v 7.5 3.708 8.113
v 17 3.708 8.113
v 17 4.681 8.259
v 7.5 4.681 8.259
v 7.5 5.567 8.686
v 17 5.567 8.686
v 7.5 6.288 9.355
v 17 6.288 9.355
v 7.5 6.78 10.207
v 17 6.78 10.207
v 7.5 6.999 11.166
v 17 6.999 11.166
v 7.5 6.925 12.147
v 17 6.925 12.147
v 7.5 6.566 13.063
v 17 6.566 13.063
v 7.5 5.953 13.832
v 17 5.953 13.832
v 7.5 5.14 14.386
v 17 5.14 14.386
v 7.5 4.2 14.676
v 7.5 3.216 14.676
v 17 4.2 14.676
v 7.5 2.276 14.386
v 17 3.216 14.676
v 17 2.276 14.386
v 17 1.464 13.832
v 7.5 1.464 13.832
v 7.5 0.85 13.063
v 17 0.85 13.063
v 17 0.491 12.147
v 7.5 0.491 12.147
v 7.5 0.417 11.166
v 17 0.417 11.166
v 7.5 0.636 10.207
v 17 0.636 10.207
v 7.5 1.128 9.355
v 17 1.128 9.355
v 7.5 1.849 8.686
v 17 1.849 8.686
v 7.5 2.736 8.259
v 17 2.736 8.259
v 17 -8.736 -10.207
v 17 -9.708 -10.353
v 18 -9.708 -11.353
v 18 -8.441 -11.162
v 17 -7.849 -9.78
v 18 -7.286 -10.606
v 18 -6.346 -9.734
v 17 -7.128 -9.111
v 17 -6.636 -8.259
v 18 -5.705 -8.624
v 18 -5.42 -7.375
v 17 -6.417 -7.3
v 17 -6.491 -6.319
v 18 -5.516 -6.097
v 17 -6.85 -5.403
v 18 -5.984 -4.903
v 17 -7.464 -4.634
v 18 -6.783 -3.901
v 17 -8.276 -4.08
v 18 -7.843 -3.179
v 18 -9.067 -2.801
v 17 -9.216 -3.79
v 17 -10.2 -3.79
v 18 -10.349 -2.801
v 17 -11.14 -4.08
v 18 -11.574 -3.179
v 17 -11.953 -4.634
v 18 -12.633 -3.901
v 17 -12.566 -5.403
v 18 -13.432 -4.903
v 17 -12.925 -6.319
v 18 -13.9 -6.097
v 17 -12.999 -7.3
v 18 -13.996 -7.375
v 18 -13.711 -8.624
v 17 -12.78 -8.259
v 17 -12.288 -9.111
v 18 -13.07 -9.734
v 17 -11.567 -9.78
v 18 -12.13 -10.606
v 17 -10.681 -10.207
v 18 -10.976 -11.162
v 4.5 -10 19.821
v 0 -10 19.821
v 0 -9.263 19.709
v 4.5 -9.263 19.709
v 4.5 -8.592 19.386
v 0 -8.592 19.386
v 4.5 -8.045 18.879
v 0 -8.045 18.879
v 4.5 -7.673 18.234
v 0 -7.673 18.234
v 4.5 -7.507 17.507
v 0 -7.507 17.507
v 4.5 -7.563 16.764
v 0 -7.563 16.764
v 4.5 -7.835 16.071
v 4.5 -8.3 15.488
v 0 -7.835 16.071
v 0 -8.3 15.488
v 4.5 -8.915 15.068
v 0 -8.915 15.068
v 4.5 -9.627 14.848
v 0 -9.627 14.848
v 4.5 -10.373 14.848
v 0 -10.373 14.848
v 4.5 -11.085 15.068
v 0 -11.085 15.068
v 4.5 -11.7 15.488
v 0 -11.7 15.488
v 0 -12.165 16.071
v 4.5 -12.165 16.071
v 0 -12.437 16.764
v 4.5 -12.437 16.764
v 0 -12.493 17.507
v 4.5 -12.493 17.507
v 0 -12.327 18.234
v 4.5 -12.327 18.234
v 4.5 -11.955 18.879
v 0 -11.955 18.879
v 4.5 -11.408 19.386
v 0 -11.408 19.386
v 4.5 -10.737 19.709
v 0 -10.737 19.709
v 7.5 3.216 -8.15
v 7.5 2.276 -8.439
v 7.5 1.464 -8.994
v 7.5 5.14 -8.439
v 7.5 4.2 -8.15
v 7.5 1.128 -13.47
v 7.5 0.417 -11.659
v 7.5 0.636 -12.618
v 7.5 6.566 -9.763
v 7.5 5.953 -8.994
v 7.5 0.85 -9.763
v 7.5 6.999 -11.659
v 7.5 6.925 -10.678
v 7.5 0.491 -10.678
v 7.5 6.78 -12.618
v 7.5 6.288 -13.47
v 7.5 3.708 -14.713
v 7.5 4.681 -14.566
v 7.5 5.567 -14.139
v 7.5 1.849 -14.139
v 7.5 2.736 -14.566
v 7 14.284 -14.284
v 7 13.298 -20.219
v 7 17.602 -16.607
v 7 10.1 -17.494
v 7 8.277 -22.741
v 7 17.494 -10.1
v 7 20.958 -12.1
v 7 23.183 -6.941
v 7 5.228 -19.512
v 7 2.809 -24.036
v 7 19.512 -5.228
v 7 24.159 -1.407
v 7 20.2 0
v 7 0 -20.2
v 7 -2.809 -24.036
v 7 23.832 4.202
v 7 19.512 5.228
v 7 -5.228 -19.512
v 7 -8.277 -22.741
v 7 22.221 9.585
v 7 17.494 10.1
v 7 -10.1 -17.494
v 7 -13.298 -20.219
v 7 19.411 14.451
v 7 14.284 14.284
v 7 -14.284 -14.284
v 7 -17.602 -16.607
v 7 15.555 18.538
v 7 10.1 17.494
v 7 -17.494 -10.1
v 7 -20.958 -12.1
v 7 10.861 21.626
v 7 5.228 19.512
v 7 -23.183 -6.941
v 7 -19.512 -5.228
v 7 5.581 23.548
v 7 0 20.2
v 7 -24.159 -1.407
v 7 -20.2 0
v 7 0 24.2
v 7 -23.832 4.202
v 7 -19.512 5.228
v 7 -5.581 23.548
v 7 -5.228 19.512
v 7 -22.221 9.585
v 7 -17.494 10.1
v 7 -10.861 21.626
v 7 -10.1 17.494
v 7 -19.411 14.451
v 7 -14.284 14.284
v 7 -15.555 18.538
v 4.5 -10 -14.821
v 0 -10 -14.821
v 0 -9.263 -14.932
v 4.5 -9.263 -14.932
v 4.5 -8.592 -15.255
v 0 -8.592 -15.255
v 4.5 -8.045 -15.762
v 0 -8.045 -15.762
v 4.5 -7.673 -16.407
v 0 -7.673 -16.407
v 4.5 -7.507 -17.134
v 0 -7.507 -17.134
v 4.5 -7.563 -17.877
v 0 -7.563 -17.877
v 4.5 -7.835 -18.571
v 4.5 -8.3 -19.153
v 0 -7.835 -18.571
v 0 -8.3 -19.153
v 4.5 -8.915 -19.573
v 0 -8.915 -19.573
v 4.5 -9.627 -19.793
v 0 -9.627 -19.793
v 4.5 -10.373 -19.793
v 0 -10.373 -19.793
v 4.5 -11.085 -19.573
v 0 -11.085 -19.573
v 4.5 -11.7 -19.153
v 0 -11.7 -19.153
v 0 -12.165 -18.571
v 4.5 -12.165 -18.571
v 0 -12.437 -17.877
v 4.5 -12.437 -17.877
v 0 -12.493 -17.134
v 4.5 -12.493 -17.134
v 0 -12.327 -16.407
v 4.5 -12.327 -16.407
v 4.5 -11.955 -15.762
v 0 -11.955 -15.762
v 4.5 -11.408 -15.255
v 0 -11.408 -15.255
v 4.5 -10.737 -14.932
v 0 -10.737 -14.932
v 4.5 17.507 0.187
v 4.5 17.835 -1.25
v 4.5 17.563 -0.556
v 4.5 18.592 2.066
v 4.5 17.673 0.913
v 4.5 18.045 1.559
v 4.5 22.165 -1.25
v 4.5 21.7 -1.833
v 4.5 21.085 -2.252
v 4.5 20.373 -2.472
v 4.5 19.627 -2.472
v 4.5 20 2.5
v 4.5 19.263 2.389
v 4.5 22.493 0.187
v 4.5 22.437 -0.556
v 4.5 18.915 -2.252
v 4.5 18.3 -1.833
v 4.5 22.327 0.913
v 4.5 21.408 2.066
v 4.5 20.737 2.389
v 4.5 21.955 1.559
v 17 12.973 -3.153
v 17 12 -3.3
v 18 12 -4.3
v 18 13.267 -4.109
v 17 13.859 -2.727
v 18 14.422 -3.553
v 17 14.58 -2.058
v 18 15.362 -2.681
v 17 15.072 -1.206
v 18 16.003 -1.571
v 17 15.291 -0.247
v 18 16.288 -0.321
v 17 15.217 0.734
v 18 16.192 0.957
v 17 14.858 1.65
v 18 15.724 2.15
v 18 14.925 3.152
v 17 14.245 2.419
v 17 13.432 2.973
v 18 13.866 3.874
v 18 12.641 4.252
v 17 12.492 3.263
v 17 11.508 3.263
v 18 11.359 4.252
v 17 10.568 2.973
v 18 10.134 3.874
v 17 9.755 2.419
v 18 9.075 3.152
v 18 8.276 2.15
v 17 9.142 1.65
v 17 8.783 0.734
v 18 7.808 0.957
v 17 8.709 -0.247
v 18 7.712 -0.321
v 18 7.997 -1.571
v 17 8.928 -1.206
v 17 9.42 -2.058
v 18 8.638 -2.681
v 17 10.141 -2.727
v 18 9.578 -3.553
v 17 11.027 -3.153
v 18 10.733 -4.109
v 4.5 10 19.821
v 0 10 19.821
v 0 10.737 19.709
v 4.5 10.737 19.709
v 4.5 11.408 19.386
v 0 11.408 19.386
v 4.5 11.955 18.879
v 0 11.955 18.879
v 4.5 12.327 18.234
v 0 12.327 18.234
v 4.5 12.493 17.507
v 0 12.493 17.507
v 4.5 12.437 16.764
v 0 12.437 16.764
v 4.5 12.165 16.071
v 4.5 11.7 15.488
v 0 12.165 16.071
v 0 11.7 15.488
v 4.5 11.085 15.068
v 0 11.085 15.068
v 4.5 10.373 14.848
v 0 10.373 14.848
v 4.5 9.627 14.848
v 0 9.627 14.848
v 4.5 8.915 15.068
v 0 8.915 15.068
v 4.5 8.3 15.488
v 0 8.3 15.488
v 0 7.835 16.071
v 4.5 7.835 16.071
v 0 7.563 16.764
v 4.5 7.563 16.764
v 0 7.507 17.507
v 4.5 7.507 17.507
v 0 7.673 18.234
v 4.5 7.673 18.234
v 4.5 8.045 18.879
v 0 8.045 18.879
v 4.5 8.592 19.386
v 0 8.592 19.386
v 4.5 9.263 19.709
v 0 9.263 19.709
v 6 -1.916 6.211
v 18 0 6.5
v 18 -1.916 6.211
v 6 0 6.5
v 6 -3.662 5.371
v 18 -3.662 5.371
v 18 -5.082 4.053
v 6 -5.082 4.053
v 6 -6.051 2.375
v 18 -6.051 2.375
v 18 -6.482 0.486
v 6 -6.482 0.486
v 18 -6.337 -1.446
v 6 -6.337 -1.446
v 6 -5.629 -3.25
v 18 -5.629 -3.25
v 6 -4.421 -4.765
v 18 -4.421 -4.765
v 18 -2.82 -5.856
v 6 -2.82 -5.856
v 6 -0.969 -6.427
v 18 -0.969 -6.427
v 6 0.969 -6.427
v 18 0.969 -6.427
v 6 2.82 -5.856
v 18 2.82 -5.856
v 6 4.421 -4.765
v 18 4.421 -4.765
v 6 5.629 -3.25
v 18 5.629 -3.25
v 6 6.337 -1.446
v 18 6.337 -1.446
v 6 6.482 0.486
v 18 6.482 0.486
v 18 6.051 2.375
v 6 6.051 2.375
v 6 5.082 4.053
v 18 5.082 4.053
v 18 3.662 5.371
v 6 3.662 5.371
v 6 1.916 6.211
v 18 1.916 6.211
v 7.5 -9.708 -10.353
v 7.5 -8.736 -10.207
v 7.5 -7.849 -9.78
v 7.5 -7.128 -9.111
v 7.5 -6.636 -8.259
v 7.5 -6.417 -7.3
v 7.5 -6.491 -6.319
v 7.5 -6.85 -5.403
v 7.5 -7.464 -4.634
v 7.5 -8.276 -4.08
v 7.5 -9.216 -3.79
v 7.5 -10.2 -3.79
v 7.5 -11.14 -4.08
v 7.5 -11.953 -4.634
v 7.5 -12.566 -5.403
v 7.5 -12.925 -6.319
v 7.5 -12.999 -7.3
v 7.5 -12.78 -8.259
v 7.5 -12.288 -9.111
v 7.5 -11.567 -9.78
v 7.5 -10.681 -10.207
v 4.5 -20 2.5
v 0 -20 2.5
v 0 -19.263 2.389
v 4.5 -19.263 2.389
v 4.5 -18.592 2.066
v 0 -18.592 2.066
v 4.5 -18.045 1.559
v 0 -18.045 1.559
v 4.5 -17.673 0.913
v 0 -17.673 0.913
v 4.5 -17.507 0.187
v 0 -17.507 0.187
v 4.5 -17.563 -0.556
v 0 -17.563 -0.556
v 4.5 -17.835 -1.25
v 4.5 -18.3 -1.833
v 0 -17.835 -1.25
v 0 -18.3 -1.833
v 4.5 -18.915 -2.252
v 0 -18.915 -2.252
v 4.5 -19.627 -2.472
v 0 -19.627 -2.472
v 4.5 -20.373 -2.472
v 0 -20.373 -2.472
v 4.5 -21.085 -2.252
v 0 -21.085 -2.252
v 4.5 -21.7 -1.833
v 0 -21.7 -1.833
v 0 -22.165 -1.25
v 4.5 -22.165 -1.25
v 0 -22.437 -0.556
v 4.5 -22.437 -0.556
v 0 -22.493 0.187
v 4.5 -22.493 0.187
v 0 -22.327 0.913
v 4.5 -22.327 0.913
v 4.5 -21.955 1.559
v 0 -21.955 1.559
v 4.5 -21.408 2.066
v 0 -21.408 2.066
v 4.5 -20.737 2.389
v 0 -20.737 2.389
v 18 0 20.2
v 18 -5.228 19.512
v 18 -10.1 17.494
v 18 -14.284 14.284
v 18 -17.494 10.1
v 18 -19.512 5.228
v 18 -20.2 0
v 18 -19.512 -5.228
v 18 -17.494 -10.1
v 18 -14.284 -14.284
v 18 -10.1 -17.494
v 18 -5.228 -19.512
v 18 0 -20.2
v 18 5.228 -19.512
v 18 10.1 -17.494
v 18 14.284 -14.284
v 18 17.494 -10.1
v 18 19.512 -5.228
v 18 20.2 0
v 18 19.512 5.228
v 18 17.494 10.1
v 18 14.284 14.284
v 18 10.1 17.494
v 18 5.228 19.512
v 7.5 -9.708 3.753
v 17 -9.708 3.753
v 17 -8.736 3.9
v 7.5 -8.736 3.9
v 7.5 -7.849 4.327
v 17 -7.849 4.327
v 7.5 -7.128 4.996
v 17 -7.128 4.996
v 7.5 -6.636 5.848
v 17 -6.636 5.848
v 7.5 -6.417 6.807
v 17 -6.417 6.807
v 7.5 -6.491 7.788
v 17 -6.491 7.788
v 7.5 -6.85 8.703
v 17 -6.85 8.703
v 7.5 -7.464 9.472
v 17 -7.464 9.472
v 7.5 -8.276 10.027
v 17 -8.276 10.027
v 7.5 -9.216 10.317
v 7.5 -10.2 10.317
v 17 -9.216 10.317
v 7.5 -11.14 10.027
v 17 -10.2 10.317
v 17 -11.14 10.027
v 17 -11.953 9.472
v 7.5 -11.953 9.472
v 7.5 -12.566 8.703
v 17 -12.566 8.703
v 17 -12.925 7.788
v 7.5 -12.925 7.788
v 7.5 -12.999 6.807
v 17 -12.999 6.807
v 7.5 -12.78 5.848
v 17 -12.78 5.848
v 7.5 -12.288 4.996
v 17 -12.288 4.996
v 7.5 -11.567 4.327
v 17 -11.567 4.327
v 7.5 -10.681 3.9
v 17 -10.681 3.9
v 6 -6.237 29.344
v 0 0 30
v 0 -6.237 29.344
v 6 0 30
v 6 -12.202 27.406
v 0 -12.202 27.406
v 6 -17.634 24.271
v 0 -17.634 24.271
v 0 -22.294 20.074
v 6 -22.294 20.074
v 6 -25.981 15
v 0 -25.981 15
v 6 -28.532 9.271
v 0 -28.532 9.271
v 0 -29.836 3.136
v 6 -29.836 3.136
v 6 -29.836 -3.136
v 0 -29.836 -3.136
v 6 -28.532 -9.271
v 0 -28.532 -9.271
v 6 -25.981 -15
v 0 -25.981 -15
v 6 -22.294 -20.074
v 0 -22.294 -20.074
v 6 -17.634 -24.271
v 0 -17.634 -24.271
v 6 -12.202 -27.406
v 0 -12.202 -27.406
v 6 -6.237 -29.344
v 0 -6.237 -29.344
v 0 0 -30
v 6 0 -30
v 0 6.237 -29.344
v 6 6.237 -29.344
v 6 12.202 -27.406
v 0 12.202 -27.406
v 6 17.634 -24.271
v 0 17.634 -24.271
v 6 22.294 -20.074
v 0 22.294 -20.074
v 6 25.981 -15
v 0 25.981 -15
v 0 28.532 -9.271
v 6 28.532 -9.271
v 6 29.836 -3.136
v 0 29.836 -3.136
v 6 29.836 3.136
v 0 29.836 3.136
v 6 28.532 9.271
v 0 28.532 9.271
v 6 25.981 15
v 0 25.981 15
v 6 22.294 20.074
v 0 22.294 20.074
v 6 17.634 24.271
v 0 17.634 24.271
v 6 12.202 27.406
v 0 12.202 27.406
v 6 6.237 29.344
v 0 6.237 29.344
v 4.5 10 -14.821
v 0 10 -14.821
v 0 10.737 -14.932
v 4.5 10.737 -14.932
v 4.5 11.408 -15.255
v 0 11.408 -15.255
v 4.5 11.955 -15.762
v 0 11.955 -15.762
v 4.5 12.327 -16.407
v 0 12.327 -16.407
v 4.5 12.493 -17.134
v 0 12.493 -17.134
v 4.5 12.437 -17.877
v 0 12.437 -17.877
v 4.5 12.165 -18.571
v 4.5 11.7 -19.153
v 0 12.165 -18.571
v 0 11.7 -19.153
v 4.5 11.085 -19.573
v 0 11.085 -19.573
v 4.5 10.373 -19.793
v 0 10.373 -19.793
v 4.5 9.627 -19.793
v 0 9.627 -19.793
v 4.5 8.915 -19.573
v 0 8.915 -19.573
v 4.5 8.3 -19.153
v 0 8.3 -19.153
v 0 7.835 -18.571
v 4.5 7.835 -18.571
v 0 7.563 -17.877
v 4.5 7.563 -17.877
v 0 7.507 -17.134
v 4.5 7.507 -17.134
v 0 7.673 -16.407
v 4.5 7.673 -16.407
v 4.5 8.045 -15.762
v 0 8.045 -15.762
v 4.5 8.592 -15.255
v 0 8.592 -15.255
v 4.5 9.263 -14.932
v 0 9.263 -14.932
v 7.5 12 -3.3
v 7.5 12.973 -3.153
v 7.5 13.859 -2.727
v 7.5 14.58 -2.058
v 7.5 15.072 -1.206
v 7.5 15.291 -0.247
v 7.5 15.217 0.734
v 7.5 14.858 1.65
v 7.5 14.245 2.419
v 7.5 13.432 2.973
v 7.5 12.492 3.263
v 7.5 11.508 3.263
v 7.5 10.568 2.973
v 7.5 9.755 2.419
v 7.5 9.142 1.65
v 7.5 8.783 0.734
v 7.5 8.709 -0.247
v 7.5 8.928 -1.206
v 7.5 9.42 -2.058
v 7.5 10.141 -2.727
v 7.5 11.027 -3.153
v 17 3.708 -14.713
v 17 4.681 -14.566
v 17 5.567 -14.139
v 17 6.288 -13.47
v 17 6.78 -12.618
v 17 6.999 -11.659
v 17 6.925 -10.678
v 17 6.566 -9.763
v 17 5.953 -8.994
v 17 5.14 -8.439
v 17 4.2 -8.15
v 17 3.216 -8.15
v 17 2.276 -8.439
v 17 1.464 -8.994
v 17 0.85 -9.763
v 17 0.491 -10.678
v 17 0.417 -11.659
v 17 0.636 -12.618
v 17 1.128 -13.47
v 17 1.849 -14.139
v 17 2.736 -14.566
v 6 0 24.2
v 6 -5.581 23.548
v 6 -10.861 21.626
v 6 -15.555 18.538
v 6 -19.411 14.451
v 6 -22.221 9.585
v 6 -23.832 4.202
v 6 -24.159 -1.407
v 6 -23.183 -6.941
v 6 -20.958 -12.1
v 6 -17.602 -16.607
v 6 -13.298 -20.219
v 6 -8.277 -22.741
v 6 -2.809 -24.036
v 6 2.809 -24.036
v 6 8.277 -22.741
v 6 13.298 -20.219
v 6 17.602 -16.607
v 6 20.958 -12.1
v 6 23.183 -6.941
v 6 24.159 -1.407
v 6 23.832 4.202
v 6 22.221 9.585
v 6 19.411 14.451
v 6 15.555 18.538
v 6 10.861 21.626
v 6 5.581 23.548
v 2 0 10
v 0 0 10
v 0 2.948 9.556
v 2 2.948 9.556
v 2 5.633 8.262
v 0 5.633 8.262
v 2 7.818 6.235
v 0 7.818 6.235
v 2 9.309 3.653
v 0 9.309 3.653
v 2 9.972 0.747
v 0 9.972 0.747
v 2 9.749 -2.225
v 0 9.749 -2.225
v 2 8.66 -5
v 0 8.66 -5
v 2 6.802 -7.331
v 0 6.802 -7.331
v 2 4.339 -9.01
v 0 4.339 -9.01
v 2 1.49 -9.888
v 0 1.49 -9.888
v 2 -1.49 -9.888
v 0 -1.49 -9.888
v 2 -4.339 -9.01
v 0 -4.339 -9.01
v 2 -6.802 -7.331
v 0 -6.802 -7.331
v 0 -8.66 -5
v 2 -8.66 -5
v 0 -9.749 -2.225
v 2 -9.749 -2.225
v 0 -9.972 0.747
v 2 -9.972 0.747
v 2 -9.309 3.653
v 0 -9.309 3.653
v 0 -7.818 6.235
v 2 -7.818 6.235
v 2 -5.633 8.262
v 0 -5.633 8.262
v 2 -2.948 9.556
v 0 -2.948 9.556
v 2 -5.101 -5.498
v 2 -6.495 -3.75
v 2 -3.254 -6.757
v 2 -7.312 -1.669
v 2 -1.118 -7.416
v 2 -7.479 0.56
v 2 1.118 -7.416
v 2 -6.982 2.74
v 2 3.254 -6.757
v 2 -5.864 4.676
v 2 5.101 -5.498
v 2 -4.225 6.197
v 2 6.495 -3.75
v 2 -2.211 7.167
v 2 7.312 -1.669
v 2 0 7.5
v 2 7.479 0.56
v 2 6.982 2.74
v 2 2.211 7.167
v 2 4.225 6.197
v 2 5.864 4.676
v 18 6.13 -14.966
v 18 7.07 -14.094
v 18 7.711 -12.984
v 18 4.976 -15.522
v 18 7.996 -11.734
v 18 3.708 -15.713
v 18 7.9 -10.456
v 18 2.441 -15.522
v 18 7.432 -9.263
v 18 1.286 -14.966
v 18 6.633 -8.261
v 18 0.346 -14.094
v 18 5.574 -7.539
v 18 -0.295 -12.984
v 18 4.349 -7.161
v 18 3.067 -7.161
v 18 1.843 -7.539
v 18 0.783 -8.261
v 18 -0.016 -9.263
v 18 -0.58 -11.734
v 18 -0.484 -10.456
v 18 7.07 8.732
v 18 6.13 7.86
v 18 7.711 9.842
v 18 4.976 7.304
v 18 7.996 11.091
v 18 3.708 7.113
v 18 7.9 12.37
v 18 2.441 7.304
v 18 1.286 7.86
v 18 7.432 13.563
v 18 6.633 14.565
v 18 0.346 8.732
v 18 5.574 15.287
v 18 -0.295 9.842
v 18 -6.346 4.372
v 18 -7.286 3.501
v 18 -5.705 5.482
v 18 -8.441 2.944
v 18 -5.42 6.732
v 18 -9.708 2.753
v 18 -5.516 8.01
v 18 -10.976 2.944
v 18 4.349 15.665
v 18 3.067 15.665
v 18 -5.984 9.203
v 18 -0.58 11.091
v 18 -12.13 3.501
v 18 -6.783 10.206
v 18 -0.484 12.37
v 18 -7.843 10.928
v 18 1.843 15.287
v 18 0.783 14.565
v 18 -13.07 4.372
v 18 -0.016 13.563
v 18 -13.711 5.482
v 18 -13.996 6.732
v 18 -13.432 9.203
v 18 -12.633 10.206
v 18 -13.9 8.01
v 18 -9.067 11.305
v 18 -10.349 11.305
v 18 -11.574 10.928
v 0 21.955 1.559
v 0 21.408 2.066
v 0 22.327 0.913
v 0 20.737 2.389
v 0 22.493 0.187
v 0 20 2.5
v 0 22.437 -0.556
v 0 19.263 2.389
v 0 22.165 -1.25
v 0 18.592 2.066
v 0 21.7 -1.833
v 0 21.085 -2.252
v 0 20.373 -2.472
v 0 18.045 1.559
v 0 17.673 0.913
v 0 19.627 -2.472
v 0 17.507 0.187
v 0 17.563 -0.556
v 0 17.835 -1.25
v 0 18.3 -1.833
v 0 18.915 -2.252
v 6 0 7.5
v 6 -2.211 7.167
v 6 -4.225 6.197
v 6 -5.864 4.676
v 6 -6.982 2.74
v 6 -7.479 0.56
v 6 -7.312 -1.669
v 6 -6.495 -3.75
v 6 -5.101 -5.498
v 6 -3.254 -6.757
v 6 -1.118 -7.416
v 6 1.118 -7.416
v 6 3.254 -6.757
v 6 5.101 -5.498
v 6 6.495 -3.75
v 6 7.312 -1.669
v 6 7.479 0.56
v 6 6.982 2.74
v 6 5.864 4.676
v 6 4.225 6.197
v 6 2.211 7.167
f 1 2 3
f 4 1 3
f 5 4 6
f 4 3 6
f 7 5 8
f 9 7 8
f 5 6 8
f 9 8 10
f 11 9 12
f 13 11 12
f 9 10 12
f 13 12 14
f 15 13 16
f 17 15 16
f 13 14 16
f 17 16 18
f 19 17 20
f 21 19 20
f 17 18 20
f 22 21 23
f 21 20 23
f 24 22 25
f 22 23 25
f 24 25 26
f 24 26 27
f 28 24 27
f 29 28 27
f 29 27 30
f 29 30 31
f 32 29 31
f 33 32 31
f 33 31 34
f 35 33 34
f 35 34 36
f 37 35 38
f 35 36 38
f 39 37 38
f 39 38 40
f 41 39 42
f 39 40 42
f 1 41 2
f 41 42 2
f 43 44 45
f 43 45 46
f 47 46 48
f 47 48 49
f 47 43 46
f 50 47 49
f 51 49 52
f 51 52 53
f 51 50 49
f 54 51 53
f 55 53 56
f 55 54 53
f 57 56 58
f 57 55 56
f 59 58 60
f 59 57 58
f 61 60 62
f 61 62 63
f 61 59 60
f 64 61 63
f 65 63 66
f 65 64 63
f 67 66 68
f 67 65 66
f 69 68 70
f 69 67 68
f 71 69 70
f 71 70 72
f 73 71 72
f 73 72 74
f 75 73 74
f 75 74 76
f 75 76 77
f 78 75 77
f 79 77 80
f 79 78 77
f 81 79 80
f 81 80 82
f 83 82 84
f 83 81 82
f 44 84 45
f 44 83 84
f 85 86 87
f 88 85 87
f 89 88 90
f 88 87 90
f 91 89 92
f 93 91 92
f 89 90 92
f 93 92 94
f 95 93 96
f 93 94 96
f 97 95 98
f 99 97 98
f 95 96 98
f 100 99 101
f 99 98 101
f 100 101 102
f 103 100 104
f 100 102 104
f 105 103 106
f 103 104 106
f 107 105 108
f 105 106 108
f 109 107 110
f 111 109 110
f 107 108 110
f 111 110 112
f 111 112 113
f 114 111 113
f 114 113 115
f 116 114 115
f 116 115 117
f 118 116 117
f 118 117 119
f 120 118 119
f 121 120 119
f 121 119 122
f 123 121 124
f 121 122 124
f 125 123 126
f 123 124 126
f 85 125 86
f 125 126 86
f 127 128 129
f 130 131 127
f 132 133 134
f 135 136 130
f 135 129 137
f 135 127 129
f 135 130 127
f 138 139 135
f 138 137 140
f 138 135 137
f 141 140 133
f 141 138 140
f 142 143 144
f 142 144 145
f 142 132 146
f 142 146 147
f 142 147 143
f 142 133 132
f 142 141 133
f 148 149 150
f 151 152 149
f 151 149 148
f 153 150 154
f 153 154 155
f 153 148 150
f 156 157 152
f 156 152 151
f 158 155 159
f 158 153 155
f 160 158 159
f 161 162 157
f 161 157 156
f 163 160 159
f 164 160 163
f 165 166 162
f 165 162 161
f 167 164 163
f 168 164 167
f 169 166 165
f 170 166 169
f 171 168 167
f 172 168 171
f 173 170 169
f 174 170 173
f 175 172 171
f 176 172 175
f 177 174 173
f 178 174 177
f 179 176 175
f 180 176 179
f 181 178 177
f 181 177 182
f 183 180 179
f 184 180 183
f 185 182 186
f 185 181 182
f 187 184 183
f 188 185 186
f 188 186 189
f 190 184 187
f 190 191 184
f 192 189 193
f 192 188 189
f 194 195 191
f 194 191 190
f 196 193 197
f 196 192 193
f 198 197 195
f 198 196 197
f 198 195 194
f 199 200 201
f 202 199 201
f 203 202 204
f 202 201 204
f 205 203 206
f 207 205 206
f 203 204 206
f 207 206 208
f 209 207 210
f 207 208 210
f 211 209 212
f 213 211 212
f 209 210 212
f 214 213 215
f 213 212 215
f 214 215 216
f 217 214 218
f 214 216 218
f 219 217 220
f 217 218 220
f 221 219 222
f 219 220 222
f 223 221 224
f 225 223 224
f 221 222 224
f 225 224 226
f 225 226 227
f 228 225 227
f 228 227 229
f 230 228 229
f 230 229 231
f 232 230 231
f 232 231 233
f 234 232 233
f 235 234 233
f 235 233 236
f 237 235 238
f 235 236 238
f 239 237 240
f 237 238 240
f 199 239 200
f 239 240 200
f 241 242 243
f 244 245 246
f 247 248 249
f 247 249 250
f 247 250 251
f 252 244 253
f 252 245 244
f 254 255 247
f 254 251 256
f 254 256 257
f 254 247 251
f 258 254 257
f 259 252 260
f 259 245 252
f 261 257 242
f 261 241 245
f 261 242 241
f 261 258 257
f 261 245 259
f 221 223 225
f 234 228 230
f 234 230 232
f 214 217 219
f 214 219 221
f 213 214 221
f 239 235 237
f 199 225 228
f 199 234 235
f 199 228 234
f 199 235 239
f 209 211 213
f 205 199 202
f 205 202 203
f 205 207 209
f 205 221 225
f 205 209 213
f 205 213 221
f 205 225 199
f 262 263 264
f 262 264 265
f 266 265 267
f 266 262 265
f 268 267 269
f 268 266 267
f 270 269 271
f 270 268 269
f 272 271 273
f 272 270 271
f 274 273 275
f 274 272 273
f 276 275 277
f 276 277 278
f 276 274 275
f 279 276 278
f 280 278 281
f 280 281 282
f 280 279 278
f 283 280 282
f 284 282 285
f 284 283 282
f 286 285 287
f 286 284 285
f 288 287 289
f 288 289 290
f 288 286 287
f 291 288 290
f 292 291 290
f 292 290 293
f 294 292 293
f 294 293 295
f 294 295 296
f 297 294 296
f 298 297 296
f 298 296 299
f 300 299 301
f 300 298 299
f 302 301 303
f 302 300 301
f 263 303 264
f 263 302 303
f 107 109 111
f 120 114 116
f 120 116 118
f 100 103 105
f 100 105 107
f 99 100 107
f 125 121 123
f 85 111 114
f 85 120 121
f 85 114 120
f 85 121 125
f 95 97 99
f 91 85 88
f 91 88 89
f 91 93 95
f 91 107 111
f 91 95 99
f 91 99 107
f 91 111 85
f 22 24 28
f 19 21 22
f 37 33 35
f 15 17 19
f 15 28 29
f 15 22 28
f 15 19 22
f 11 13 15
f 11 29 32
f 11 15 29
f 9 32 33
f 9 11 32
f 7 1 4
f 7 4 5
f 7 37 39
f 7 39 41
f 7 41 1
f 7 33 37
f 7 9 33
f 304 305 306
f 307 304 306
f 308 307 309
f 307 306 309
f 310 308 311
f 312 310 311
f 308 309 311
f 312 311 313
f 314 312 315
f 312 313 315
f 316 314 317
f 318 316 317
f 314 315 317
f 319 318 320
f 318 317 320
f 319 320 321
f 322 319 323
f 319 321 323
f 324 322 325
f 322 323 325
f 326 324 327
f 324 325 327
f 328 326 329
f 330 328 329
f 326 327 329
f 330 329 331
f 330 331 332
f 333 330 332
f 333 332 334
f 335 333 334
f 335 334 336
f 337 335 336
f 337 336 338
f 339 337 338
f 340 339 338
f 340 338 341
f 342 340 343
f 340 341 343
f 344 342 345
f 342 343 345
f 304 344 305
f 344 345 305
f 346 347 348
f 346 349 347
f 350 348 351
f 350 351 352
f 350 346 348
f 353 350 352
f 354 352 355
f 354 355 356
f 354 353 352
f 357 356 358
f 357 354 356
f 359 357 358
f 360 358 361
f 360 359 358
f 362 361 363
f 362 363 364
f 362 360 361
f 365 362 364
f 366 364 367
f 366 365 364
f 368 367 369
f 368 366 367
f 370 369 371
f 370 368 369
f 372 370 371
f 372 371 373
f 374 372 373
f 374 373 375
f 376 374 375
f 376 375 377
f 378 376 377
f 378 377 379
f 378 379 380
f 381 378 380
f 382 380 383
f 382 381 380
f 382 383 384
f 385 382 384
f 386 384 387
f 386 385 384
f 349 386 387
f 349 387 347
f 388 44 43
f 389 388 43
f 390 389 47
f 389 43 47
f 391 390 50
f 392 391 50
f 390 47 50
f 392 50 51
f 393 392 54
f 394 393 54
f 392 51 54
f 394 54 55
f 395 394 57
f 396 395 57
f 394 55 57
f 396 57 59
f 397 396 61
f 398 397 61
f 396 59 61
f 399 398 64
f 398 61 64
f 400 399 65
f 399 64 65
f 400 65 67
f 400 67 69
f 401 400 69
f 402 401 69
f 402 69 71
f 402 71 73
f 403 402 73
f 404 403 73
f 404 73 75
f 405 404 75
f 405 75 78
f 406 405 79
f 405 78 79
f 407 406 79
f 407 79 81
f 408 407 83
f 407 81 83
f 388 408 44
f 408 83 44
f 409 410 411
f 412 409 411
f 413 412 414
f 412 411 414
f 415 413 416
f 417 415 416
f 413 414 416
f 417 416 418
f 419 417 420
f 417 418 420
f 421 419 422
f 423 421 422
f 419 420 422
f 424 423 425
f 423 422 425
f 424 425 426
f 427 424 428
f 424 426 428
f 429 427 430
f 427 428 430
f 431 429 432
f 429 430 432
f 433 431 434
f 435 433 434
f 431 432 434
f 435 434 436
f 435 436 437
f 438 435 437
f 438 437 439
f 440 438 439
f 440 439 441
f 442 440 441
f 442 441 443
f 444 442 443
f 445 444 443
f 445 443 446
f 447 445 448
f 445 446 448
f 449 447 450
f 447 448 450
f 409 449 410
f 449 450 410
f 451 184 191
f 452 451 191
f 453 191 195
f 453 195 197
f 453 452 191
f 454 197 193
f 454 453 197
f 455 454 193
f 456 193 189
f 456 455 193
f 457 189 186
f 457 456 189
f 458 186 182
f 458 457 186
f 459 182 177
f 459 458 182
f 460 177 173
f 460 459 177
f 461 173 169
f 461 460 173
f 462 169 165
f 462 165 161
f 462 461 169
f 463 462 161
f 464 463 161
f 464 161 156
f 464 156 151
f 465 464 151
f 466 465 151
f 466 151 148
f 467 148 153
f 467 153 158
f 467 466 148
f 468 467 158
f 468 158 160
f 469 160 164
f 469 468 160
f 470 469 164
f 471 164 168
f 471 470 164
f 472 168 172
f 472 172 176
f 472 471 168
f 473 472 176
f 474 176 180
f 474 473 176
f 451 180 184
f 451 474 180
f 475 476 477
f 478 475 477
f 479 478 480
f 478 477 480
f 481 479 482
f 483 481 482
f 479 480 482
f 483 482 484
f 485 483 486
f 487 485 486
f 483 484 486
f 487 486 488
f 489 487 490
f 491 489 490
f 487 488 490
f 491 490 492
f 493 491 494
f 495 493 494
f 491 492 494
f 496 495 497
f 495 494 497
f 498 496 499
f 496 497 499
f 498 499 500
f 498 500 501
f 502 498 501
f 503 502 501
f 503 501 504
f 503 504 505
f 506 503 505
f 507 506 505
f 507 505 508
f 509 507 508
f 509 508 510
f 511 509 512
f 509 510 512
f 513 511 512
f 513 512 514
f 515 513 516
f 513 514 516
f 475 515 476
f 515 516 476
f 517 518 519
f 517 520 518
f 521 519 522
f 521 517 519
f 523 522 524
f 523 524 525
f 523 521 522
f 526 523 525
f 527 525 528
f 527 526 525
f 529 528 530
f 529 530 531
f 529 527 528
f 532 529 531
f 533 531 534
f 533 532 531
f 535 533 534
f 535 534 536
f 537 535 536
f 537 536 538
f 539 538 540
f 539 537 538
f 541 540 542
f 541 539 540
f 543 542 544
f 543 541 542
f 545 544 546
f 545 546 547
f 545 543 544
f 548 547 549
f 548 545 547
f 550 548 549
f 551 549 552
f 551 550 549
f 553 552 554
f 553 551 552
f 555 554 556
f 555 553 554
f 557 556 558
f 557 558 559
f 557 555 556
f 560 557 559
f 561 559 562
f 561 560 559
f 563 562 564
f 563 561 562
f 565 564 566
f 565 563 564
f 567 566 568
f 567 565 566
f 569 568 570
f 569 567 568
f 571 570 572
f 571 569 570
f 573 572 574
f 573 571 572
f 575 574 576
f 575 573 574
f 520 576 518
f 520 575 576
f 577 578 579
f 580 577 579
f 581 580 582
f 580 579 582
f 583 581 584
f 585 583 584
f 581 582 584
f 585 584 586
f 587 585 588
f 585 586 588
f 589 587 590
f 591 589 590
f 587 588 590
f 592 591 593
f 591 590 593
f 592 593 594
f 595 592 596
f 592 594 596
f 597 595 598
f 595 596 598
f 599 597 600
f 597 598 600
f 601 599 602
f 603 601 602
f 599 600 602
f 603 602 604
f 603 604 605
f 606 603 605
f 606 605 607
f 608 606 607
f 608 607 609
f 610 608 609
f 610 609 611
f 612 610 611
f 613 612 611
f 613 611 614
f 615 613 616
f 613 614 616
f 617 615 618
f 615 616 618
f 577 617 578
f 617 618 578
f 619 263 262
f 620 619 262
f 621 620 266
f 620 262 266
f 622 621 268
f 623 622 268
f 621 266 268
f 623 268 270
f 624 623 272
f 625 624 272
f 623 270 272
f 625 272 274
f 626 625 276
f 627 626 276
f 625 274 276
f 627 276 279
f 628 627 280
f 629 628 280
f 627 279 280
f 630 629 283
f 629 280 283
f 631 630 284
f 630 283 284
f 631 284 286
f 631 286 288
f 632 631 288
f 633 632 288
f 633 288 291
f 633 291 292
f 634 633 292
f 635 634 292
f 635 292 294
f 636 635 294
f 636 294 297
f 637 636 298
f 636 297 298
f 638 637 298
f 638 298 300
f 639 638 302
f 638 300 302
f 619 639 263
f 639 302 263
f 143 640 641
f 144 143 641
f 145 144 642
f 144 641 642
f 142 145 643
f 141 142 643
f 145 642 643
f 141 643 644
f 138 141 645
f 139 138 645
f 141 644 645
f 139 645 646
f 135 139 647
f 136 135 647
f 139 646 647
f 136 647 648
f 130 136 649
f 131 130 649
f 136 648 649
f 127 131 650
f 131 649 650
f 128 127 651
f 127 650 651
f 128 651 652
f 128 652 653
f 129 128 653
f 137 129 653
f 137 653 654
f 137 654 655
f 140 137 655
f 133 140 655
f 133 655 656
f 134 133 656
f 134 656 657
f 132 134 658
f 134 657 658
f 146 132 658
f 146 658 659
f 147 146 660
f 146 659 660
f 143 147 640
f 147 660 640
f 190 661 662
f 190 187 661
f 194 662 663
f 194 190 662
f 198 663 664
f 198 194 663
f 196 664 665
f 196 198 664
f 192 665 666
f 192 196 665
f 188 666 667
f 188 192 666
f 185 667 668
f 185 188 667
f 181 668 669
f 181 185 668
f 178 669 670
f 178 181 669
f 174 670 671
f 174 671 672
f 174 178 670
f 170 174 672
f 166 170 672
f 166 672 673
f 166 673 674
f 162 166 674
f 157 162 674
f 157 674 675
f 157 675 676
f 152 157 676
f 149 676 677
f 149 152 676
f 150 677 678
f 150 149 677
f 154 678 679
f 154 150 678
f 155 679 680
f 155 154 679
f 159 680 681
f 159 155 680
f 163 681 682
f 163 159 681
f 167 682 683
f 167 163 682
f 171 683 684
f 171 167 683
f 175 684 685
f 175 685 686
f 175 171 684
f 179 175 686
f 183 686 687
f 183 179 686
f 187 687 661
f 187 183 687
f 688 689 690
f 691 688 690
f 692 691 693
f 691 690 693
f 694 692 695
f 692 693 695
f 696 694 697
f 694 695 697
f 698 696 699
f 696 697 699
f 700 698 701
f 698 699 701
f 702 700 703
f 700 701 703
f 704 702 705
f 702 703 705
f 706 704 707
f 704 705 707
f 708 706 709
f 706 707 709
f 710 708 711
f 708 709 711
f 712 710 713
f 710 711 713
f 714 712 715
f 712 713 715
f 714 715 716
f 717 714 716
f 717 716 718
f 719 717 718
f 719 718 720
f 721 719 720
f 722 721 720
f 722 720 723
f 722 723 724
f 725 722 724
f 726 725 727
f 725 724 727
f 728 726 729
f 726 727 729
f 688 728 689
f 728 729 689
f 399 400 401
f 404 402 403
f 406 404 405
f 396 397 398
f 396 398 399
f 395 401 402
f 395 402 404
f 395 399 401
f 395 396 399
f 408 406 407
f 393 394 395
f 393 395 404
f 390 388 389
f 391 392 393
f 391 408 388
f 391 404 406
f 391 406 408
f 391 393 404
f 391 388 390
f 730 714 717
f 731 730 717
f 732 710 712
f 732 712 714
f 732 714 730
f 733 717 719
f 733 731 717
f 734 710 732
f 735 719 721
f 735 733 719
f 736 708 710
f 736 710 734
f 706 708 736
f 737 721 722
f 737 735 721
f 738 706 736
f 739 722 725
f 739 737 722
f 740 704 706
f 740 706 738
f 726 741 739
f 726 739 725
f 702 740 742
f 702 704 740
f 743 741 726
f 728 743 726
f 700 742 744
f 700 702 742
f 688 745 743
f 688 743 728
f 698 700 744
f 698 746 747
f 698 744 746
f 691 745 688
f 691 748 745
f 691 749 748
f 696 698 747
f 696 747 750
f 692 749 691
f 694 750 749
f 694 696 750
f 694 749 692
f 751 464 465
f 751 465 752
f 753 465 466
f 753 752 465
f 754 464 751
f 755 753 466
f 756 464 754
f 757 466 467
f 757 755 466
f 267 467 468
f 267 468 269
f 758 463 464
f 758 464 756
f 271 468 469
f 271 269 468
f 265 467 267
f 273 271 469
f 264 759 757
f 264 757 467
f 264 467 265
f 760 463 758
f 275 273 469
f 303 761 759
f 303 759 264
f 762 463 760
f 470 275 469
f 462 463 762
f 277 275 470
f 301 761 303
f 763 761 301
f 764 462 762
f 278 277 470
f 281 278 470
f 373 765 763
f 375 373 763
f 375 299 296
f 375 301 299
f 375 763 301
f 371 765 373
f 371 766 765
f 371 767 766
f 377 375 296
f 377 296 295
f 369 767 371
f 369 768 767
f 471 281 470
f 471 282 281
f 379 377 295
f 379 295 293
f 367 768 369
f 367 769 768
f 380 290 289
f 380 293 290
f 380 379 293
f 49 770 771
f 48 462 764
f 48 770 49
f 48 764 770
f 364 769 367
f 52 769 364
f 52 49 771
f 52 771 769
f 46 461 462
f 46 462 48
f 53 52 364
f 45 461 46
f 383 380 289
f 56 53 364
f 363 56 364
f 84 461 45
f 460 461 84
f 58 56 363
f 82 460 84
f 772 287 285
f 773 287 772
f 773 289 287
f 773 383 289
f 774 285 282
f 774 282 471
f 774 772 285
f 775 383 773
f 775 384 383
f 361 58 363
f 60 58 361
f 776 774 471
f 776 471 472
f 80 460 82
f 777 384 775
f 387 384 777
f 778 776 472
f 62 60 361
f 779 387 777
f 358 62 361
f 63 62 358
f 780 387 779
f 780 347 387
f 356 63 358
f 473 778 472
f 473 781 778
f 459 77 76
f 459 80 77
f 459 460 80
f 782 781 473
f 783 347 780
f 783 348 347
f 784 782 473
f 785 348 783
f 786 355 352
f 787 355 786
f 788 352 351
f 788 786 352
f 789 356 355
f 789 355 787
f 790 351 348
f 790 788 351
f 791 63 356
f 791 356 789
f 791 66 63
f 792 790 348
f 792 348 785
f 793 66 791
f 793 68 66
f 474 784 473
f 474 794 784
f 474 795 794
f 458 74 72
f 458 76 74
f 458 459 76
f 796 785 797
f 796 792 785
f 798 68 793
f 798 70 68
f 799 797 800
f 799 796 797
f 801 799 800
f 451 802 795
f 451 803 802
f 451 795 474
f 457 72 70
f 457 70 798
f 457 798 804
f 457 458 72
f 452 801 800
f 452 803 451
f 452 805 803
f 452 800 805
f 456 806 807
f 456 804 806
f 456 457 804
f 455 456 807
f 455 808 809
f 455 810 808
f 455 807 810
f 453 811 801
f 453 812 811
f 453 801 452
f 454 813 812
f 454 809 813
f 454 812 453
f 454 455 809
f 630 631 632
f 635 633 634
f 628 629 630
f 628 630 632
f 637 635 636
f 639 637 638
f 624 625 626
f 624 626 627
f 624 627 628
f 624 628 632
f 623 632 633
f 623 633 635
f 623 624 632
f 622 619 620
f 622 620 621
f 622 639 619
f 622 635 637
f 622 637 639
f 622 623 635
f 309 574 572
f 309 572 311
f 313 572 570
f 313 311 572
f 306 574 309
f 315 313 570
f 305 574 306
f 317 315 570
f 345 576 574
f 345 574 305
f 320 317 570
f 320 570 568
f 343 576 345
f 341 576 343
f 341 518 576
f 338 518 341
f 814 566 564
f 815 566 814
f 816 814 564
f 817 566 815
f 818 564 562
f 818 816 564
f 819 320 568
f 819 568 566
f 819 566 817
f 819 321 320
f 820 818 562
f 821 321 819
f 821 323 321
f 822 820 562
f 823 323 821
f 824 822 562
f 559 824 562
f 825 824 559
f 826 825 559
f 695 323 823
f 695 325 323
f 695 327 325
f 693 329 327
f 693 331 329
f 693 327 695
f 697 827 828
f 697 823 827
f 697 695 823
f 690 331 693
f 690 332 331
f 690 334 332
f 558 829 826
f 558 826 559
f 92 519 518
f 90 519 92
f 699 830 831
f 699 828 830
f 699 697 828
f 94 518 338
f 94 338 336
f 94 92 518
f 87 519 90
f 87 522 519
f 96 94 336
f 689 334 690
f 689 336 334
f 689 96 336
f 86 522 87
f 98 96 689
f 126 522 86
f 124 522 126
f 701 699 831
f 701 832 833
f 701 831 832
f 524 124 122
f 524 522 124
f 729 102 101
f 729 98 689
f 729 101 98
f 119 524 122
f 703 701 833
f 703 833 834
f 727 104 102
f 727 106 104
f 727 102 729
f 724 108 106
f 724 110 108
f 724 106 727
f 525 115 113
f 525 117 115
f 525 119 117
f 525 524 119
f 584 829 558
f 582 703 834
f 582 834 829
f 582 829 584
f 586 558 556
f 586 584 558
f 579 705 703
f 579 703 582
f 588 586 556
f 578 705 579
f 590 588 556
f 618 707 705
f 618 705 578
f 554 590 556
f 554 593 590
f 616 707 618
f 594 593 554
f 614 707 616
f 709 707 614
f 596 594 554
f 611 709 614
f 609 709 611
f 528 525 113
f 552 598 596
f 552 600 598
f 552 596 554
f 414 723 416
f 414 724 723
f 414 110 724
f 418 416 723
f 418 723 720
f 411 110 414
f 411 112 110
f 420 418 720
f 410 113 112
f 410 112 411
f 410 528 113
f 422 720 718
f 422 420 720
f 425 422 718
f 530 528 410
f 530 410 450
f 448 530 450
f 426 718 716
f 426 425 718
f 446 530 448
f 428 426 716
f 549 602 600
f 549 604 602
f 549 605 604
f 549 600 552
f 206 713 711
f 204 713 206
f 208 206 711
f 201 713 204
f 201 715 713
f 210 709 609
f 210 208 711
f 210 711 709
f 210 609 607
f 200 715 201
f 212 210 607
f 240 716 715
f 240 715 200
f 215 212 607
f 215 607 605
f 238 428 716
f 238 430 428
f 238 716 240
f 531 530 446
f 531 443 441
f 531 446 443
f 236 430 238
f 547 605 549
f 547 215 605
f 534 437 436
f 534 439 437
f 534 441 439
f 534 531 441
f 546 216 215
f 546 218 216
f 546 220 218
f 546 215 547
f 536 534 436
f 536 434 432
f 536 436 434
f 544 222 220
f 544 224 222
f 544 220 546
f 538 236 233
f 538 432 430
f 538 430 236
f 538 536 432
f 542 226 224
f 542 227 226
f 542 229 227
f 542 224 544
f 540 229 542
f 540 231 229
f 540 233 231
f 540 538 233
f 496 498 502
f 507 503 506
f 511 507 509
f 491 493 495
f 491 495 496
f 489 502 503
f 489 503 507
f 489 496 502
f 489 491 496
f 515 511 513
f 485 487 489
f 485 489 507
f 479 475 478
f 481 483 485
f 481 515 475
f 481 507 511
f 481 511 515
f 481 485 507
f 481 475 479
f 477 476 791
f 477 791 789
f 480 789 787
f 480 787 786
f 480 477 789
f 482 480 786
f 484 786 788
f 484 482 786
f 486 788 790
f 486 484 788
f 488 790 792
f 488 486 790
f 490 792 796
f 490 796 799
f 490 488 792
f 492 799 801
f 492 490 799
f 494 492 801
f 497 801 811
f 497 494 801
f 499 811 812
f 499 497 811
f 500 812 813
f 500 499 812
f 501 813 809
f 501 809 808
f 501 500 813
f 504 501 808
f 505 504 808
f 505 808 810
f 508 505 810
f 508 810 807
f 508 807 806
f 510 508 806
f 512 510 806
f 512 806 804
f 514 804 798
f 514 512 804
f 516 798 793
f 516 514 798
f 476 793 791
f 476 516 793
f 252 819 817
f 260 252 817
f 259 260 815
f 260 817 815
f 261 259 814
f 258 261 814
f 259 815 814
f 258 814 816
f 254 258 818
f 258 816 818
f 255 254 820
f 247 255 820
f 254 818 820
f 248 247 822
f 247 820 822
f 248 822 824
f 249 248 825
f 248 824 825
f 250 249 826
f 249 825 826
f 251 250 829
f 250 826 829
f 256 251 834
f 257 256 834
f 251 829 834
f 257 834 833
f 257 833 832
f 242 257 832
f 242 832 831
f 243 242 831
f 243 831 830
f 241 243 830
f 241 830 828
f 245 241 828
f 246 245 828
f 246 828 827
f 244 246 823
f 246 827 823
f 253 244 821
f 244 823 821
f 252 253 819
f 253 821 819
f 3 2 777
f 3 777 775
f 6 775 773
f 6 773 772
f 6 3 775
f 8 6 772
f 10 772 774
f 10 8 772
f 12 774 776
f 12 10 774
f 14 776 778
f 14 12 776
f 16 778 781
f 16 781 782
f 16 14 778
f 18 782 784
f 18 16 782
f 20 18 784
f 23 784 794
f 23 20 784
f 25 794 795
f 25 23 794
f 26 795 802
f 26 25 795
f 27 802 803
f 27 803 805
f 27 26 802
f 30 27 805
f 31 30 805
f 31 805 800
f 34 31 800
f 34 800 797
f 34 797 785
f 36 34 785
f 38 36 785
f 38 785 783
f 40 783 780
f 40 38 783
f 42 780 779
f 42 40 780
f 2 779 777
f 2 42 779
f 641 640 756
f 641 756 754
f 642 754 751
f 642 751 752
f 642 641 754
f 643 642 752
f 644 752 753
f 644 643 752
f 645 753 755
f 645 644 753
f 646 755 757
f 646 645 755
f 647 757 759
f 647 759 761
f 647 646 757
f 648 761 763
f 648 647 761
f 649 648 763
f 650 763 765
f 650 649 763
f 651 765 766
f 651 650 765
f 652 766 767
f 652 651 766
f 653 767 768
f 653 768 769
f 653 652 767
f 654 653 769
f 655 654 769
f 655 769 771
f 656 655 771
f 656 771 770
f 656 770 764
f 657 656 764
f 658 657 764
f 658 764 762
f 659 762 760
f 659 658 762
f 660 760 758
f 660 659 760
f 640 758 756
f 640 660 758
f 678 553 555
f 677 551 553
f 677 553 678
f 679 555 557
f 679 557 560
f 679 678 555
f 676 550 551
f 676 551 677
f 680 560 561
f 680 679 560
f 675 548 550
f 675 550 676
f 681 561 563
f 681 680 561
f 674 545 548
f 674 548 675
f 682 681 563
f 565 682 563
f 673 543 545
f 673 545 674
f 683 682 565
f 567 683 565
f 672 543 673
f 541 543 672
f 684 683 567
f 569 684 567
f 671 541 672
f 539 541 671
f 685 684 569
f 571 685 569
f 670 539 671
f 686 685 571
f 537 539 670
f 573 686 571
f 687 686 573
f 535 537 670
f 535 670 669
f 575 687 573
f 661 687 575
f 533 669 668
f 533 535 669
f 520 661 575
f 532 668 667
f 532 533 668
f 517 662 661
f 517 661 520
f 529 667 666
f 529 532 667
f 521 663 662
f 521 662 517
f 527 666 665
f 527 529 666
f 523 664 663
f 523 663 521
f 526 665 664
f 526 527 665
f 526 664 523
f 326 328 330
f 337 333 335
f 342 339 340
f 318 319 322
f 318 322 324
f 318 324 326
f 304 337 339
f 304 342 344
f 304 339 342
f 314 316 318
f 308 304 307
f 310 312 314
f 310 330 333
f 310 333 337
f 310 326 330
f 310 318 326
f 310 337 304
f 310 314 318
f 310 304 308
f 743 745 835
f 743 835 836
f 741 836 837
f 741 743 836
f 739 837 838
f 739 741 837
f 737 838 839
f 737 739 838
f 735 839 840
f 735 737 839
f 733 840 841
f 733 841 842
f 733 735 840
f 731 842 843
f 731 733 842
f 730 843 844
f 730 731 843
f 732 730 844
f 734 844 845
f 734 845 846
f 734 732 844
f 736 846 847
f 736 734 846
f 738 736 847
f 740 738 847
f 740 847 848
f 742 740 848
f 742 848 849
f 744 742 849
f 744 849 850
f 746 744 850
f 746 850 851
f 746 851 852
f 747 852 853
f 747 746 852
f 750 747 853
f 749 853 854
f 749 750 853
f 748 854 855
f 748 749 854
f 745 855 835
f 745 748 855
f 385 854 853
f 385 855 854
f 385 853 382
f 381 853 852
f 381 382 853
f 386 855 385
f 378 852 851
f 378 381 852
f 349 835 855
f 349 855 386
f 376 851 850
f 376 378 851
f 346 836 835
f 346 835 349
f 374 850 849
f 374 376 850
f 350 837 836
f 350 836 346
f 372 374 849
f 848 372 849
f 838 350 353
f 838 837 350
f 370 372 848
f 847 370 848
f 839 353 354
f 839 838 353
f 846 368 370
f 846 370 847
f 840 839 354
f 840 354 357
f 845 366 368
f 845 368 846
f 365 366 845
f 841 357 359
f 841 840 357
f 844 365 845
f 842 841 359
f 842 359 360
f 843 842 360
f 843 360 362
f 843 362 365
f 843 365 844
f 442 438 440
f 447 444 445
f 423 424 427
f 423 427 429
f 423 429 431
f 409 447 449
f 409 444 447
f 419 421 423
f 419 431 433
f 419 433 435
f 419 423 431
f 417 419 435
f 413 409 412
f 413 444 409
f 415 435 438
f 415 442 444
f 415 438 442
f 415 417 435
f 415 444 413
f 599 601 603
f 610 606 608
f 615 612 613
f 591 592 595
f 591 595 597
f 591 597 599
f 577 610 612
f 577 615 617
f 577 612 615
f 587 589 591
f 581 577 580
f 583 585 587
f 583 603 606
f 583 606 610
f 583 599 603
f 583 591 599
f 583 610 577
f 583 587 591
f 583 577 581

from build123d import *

# Parameters (mm, degrees)
SKETCH2_R          = 2.5
CUT_EXTRUDE1_DEPTH = 4.5
SKETCH3_R          = 3.3
CUT_EXTRUDE2_DEPTH = 10.5
CHAMFER1_SIZE      = 1
SKETCH4_R          = 10
CUT_EXTRUDE3_DEPTH = 2


with BuildPart() as part:
    # Sketch1 → Revolve1 (revolve)
    with BuildSketch(Plane.XY, mode=Mode.PRIVATE) as revolve1_sk:
        Polygon((0, 30), (6, 30), (6, 24.2), (7, 24.2), (7, 20.2), (18, 20.2), (18, 6.5), (6, 6.5), (6, 7.5), (0, 7.5), align=None)
    revolve(revolve1_sk.sketch.rotate(Axis((0, 0, 0), (1, 0, 0)), 90), axis=Axis((0, 0, 0), (1, 0, 0)))

    # Sketch2 → Cut-Extrude1 (cut)
    with BuildSketch(Plane.ZY):
        with Locations((0, 20)):
            Circle(SKETCH2_R)
        with Locations((17.320508076, 10)):
            Circle(SKETCH2_R)
        with Locations((17.320508076, -10)):
            Circle(SKETCH2_R)
        with Locations((0, -20)):
            Circle(SKETCH2_R)
        with Locations((-17.320508076, -10)):
            Circle(SKETCH2_R)
        with Locations((-17.320508076, 10)):
            Circle(SKETCH2_R)
    extrude(amount=-CUT_EXTRUDE1_DEPTH, mode=Mode.SUBTRACT)

    # Sketch3 → Cut-Extrude2 (cut)
    with BuildSketch(Plane(origin=(18, 0, 0), x_dir=(0, 0, -1), z_dir=(1, 0, 0))):
        with Locations((0, 12)):
            Circle(SKETCH3_R)
        with Locations((11.412678196, 3.708203932)):
            Circle(SKETCH3_R)
        with Locations((7.053423028, -9.708203932)):
            Circle(SKETCH3_R)
        with Locations((-7.053423028, -9.708203932)):
            Circle(SKETCH3_R)
        with Locations((-11.412678196, 3.708203932)):
            Circle(SKETCH3_R)
    extrude(amount=-CUT_EXTRUDE2_DEPTH, mode=Mode.SUBTRACT)

    # Chamfer1
    chamfer1_edges = [part.edges().sort_by_distance(p)[0] for p in [
        (18, 12, 3.3),
        (18, 3.708203932, -8.112678196),
        (18, -9.708203932, -3.753423028),
        (18, -9.708203932, 10.353423028),
        (18, 3.708203932, 14.712678196),
    ]]
    chamfer(chamfer1_edges, length=CHAMFER1_SIZE)

    # Sketch4 → Cut-Extrude3 (cut)
    with BuildSketch(Plane.ZY):
        Circle(SKETCH4_R)
    extrude(amount=-CUT_EXTRUDE3_DEPTH, mode=Mode.SUBTRACT)


solid = part.part
